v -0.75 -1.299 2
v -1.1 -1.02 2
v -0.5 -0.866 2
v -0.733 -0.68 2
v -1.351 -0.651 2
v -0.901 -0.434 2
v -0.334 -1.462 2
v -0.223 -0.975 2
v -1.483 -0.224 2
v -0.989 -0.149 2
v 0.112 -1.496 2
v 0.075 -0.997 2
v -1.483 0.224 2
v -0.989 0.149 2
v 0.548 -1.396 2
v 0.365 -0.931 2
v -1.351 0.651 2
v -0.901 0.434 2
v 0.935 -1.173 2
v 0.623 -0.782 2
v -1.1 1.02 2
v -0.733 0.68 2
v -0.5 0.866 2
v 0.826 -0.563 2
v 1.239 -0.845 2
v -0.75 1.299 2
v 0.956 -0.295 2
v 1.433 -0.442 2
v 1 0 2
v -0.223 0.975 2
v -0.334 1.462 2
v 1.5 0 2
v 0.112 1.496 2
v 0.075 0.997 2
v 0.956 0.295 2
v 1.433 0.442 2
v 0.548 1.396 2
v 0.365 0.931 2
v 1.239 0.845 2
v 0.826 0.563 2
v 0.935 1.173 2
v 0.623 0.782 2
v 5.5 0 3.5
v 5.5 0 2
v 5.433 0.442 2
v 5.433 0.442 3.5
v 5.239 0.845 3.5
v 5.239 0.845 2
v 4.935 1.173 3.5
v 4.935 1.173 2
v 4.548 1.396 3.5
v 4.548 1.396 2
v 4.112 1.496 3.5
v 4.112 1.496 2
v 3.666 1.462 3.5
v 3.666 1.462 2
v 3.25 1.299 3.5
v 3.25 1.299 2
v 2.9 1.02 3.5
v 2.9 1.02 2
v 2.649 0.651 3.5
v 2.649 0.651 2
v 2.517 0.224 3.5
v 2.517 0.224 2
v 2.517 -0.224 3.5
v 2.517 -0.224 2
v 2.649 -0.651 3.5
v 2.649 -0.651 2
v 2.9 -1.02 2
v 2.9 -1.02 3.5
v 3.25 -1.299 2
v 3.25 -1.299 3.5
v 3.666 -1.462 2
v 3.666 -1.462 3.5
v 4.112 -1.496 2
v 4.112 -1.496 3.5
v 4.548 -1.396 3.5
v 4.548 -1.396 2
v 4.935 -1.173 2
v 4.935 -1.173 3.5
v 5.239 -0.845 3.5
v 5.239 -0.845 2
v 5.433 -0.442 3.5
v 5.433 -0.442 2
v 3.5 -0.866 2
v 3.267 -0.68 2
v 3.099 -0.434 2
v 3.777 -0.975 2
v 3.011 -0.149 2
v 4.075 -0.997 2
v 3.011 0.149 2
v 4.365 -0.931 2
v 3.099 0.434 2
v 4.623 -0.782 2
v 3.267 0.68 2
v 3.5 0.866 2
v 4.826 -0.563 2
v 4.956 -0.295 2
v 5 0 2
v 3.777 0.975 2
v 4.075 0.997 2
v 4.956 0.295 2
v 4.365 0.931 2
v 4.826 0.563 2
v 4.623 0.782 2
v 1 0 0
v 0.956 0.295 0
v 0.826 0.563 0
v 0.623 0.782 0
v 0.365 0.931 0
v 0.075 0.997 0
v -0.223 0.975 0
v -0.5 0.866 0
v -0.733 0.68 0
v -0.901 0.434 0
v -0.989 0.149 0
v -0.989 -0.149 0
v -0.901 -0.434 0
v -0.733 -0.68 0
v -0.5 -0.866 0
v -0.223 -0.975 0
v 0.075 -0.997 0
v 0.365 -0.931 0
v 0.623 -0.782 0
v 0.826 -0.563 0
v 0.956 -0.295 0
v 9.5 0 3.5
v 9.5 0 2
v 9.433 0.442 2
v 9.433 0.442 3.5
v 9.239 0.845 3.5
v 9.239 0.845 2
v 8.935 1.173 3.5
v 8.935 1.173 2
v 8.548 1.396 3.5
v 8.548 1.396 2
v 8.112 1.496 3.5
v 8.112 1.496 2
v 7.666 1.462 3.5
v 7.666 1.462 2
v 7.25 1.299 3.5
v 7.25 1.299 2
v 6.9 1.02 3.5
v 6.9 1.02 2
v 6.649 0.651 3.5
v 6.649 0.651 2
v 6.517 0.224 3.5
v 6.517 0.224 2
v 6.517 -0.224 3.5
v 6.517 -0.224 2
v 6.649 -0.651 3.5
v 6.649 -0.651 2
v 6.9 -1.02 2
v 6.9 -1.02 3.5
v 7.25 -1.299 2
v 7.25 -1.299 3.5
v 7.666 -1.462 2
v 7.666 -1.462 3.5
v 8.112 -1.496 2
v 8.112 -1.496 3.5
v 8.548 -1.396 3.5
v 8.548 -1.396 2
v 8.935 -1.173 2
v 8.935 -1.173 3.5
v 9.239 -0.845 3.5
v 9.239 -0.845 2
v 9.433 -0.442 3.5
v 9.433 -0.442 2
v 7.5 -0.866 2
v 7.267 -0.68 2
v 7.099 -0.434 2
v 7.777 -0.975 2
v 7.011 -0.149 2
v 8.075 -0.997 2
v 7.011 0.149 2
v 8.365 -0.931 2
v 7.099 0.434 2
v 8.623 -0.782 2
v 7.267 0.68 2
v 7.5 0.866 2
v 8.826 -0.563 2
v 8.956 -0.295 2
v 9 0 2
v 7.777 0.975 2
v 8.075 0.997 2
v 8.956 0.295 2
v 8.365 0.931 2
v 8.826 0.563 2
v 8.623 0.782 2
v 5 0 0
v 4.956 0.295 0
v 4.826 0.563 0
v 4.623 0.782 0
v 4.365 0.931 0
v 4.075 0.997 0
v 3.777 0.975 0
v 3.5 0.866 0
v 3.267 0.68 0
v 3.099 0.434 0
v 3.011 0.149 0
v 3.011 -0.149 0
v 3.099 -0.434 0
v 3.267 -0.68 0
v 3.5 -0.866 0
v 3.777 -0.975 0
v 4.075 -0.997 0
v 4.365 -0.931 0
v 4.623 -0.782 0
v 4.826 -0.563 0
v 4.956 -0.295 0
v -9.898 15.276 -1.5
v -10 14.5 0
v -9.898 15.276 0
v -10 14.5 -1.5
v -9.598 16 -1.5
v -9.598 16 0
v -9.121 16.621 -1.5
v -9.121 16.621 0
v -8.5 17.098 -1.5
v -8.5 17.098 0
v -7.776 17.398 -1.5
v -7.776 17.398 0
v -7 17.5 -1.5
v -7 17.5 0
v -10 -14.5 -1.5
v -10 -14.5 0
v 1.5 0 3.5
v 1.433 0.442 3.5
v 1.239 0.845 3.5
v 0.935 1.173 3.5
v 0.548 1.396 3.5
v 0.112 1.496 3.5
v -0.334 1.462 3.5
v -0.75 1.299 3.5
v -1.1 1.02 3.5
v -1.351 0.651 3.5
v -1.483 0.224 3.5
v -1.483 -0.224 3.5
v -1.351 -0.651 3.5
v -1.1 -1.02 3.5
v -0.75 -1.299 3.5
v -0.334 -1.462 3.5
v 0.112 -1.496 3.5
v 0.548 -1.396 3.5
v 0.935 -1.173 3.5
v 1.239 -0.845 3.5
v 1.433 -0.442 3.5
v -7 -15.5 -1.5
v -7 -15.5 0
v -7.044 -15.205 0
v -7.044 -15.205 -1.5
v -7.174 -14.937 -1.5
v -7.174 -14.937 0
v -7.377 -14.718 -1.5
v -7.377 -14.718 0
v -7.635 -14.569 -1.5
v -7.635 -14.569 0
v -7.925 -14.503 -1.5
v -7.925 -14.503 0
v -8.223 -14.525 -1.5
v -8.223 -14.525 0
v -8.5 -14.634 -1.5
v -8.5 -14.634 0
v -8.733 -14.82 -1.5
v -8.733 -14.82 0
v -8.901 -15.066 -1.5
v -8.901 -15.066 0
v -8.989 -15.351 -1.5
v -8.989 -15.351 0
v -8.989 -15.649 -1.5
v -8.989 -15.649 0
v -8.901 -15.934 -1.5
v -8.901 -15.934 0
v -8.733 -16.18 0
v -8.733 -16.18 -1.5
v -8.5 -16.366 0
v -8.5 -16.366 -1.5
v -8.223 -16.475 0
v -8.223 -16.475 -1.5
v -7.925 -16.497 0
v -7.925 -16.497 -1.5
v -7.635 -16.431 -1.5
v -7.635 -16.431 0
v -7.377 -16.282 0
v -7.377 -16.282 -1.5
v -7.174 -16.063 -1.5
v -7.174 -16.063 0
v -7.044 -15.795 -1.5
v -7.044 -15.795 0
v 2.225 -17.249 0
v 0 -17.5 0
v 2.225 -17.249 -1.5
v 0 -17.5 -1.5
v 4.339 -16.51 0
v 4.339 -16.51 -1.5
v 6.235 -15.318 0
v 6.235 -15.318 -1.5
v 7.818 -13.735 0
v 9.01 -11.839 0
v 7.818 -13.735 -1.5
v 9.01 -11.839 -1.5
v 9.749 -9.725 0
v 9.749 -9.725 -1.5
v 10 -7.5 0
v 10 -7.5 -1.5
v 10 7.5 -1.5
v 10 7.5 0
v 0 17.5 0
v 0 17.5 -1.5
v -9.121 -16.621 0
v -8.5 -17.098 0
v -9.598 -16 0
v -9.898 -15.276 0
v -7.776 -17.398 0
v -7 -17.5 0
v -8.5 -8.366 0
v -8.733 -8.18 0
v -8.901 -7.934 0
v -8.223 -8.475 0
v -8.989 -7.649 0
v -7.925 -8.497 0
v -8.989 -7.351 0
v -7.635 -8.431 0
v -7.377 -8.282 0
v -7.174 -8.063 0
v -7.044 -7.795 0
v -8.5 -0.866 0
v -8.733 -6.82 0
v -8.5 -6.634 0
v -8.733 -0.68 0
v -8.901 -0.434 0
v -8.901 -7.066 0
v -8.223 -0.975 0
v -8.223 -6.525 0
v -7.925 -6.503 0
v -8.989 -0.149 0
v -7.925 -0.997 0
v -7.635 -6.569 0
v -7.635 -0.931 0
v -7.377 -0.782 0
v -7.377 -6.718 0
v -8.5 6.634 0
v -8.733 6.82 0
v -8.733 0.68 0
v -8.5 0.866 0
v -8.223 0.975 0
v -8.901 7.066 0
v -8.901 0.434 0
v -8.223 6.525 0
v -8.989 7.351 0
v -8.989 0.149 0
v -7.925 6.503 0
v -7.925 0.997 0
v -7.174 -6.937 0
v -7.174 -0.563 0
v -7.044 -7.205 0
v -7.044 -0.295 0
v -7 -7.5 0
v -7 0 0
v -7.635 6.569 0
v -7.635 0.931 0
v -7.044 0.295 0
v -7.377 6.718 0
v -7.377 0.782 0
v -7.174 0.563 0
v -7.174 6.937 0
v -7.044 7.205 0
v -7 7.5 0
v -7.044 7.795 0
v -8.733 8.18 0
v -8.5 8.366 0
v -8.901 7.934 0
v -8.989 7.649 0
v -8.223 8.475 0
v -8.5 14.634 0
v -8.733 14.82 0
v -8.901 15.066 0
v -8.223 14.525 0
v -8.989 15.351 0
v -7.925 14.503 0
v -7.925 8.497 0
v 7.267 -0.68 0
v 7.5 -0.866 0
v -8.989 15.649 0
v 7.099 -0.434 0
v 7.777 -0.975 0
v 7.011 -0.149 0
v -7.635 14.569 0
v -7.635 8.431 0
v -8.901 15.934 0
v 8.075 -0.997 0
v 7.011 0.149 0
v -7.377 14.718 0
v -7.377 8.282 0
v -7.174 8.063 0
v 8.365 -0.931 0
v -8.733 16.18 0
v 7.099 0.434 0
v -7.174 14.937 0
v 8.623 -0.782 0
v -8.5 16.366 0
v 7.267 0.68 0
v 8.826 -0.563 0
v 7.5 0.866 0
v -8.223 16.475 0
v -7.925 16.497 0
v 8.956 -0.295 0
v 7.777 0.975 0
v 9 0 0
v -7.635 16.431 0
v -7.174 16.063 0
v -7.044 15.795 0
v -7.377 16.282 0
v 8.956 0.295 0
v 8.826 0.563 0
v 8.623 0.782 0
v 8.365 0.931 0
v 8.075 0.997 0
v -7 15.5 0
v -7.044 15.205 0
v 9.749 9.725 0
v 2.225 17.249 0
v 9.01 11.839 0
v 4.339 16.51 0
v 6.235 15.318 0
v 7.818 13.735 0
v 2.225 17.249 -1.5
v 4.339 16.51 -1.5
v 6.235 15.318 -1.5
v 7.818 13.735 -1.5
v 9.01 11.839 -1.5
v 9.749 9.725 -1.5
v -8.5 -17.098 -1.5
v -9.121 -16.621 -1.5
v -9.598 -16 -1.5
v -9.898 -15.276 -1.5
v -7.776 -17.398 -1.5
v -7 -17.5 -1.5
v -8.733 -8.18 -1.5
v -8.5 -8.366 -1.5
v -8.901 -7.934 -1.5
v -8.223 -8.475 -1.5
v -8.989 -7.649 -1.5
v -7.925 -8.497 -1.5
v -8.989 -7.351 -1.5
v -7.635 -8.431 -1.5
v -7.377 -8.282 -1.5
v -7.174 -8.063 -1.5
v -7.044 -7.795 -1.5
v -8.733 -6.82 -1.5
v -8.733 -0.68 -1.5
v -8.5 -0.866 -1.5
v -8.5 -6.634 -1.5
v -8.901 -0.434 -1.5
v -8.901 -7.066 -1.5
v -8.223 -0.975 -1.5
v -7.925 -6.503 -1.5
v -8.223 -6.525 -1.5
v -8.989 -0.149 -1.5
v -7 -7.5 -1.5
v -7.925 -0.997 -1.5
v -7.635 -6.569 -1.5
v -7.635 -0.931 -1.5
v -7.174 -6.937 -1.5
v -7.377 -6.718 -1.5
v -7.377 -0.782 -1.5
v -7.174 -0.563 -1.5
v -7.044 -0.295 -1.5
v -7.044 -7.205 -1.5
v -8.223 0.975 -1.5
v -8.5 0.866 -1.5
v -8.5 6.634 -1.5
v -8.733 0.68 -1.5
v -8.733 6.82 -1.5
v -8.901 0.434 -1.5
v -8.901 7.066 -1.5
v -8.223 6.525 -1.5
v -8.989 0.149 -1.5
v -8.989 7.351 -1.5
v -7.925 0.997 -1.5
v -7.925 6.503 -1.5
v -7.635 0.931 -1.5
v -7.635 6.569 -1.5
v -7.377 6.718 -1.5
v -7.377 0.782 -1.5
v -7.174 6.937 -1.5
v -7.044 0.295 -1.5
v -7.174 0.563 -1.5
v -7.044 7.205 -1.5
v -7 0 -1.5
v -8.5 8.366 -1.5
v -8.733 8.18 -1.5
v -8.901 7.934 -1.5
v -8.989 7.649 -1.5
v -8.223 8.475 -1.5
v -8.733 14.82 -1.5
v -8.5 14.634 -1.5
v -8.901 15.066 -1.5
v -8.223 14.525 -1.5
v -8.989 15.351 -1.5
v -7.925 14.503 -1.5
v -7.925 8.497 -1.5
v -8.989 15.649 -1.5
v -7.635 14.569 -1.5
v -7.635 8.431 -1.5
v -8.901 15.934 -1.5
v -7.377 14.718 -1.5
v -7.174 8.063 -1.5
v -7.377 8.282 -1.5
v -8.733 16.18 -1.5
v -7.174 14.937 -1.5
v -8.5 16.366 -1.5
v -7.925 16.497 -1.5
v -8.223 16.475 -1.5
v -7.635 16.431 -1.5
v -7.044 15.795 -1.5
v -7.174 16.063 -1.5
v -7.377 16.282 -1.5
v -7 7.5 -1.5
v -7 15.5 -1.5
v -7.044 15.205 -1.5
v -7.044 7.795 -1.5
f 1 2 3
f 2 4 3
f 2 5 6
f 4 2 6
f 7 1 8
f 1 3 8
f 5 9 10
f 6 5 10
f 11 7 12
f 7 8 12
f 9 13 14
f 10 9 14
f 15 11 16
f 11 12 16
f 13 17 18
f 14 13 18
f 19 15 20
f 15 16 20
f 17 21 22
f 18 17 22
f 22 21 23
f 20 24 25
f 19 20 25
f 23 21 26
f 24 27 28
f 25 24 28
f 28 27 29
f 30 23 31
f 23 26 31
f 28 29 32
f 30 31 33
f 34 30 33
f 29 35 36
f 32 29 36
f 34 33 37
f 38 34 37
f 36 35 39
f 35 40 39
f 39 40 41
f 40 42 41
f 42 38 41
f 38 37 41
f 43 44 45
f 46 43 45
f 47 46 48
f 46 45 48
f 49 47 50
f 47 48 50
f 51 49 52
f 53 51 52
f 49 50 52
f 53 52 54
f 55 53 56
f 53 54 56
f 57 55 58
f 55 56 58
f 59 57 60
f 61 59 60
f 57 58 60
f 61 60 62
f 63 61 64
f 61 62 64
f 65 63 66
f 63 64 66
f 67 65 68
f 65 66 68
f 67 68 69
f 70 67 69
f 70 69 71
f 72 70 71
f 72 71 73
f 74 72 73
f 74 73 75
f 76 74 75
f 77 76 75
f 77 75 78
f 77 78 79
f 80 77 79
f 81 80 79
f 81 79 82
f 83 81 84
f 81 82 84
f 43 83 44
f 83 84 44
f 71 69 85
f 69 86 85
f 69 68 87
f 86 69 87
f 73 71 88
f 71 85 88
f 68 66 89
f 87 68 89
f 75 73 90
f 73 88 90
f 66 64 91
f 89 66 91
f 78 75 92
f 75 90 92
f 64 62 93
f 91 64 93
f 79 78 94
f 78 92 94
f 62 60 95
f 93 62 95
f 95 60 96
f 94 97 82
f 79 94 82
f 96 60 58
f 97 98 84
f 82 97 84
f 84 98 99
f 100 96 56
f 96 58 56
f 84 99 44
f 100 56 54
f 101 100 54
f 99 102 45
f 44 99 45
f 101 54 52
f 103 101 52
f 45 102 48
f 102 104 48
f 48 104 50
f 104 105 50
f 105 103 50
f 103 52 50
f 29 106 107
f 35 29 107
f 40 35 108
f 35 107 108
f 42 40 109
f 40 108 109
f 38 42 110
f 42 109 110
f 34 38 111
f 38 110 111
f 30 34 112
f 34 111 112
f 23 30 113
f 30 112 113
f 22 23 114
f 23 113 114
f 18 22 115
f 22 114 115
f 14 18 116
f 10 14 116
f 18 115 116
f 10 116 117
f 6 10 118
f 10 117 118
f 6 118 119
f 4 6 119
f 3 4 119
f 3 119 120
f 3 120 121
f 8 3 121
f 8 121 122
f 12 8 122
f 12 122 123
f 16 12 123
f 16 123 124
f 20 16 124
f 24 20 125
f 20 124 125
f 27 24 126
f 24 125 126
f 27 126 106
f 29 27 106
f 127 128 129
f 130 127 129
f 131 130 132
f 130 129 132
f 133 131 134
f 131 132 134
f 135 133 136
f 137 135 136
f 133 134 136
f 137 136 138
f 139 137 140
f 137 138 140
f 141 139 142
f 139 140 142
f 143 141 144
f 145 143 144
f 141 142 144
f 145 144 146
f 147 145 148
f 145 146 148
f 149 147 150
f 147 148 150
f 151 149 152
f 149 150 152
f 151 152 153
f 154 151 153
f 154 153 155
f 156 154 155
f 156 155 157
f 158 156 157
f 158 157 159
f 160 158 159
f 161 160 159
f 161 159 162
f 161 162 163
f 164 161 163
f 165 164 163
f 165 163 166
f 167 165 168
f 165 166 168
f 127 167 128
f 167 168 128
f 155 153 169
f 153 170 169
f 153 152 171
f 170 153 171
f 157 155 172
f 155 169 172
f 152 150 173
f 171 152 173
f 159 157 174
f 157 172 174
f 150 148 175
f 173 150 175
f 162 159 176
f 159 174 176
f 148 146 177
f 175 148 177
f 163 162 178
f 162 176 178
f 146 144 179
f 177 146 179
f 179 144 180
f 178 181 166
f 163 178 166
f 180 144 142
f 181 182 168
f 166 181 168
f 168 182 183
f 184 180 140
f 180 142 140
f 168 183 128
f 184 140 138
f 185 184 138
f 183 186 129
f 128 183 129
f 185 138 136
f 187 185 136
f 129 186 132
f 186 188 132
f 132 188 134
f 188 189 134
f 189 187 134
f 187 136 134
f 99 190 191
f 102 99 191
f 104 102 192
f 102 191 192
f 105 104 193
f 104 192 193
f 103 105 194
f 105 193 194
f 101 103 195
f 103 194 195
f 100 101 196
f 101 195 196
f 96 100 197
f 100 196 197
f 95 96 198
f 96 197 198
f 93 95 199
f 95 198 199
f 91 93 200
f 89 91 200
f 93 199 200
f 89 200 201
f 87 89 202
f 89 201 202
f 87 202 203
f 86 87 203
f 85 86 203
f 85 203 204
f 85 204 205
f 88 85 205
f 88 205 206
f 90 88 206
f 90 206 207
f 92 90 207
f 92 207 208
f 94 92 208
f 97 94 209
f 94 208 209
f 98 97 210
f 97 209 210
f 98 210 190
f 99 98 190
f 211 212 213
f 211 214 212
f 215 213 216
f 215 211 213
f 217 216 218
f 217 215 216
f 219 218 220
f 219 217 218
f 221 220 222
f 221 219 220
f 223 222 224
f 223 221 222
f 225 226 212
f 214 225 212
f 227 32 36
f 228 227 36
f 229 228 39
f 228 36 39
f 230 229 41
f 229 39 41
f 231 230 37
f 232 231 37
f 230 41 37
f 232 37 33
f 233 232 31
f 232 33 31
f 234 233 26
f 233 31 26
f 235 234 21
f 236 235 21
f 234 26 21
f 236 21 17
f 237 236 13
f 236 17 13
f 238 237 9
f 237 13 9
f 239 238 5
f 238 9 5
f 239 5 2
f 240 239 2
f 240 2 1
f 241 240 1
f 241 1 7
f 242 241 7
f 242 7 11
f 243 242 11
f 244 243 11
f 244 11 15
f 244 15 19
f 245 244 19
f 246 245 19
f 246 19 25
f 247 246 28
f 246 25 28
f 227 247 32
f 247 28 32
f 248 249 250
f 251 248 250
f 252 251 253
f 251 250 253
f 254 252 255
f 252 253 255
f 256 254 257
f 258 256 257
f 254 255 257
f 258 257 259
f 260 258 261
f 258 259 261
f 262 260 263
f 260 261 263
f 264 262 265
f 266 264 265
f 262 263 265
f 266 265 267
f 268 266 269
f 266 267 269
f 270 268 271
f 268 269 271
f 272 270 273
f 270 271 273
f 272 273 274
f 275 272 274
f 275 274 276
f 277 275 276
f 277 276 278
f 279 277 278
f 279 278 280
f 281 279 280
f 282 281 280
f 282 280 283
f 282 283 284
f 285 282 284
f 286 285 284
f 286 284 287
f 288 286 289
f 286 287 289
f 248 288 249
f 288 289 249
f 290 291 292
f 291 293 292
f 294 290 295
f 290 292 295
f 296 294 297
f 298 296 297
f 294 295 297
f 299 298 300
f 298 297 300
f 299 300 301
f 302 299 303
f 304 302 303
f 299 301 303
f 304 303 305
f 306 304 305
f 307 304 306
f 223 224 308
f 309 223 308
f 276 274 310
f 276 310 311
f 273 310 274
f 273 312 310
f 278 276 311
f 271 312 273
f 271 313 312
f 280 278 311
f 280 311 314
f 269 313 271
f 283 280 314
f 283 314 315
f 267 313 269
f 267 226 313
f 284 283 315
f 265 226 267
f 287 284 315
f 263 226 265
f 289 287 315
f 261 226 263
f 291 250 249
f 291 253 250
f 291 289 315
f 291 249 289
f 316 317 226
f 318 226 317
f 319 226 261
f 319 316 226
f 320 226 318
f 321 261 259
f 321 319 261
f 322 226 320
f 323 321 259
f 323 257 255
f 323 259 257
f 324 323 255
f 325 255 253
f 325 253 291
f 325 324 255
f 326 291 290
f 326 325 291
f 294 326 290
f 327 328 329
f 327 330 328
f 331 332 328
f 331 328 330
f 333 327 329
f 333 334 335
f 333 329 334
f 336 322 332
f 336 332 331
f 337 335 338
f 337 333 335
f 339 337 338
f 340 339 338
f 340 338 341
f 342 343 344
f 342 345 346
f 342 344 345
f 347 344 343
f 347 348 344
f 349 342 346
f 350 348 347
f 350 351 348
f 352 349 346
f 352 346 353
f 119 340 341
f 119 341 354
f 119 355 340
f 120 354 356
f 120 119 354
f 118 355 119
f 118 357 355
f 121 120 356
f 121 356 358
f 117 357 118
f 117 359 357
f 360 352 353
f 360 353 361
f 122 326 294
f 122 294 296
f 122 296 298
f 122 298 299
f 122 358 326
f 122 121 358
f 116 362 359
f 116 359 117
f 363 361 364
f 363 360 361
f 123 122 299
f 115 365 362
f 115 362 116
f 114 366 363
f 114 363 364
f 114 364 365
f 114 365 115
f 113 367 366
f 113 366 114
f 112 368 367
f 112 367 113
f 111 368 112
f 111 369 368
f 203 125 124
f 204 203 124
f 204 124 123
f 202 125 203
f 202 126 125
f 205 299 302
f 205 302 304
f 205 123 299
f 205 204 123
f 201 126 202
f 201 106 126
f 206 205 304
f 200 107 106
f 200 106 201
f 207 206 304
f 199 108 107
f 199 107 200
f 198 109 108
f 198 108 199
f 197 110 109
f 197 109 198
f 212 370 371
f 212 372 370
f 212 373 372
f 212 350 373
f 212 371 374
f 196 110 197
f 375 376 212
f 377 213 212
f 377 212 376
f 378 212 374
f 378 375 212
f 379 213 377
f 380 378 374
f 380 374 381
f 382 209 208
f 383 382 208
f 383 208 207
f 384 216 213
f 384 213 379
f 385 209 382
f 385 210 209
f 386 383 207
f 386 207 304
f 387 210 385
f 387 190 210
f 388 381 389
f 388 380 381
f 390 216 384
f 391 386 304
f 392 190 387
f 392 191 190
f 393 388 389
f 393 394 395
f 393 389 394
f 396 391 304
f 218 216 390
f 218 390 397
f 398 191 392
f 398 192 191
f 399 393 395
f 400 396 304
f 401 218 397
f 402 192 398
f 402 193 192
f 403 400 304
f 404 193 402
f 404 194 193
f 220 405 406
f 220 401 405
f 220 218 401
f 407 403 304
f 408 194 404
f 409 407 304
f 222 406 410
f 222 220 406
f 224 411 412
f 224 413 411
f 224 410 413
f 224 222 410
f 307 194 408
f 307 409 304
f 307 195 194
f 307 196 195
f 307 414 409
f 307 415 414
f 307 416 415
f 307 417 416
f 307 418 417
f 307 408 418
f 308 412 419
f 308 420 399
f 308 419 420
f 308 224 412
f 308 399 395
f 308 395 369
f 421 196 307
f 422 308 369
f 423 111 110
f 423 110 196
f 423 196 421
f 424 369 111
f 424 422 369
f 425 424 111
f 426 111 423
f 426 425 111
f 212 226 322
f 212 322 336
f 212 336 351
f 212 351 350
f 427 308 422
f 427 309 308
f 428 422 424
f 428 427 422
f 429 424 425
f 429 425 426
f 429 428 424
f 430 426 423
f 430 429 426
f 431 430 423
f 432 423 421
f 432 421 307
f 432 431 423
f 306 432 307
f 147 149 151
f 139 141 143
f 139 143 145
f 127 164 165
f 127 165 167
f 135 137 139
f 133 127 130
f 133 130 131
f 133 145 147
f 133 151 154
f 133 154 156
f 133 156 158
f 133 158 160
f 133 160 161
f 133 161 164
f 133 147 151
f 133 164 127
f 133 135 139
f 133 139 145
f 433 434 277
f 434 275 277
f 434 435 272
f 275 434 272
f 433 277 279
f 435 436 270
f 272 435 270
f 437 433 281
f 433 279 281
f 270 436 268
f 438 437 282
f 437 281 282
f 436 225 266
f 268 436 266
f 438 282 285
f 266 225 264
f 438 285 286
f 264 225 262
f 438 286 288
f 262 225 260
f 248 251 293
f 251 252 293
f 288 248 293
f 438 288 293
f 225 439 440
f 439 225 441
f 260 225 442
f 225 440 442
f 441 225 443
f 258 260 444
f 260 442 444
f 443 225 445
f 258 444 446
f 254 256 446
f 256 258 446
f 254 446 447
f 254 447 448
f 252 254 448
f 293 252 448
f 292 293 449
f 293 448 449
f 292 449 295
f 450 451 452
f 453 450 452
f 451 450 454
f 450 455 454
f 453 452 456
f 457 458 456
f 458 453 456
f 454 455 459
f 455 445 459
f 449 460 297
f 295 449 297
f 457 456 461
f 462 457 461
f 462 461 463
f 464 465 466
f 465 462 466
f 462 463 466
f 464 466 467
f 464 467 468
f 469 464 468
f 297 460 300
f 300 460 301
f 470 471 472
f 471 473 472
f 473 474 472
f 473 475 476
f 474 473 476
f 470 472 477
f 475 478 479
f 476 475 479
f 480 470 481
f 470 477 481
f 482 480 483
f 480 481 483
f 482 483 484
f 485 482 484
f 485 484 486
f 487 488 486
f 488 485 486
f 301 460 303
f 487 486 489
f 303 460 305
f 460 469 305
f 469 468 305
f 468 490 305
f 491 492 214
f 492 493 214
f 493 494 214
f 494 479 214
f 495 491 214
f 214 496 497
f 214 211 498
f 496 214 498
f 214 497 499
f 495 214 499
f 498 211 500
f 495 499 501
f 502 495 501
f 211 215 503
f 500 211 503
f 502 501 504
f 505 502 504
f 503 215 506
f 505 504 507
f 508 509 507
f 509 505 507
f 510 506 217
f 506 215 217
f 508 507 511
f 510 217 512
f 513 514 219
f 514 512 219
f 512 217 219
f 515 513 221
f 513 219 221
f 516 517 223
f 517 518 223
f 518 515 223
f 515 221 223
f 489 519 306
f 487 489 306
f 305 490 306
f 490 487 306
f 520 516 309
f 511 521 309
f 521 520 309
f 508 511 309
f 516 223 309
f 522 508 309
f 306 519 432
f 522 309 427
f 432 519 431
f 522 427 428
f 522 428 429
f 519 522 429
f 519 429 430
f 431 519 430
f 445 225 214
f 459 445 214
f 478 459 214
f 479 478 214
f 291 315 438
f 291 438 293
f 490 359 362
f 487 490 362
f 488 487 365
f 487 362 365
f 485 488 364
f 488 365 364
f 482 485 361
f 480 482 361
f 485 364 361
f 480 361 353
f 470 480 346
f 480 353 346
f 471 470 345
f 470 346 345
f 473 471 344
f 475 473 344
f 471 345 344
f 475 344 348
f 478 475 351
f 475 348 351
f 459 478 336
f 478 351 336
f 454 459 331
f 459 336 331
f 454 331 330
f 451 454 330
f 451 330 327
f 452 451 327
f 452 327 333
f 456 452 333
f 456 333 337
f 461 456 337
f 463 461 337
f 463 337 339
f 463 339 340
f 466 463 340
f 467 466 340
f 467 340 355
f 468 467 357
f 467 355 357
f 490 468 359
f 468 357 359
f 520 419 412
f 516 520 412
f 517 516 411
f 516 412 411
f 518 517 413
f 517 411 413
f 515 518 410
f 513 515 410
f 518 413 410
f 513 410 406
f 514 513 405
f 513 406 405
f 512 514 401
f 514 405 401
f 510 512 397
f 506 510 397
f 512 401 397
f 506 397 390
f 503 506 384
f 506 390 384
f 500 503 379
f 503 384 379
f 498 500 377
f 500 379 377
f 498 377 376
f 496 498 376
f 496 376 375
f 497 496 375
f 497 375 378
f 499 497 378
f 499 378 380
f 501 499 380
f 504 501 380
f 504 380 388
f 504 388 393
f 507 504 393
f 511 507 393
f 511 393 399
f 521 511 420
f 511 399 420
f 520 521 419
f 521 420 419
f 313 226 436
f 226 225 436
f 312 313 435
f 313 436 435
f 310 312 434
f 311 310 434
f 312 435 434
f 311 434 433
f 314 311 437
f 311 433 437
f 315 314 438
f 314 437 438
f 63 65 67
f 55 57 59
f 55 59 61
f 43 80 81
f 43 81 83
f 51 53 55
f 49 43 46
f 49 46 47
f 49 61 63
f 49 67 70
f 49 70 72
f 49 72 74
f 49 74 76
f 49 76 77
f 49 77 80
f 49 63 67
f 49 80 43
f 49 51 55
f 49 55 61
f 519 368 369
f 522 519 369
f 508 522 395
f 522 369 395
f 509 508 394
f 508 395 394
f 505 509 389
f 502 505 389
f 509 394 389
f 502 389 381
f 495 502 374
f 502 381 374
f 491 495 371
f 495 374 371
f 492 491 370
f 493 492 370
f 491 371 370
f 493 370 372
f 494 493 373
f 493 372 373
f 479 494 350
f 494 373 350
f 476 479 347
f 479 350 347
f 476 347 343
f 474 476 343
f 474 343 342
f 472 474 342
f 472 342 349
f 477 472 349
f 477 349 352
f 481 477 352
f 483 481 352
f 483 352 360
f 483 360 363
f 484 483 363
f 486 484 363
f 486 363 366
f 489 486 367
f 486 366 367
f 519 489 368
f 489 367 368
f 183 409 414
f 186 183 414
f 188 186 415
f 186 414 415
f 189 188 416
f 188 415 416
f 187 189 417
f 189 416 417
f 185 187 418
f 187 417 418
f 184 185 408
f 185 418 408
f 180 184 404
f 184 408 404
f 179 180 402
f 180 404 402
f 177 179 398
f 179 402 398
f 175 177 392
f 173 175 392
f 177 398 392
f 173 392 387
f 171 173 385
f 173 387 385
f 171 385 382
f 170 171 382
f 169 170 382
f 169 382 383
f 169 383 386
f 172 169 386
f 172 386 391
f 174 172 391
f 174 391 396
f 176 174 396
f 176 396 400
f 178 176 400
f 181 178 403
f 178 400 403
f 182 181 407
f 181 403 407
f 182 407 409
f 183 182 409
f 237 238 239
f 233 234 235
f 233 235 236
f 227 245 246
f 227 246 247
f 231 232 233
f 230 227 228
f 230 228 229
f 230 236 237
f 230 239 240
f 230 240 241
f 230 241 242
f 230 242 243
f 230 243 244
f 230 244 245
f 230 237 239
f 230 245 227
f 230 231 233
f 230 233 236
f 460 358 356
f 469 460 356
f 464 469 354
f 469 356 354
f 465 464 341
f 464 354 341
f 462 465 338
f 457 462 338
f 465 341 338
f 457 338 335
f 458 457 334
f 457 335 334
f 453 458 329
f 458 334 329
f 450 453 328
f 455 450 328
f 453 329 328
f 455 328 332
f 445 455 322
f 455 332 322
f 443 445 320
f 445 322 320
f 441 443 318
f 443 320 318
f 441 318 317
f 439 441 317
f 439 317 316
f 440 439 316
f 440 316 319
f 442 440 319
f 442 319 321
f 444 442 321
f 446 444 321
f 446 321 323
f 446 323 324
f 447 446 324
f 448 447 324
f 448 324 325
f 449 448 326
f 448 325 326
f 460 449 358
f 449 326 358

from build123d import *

# Parameters (mm, degrees)
F0_W     = 20
F0_H     = 35
F1_DEPTH = 1.5
F2_R     = 1
F3_DEPTH = 1.5
F4_R     = 3
F5_R     = 10
F6_R     = 1
F7_DEPTH = 2
F8_R     = 1.5
F8_R_2   = 1
F9_DEPTH = 1.5


with BuildPart() as f1:
    # F0 (on Top) → F1 (new body)
    with BuildSketch(Plane.XY):
        Rectangle(F0_W, F0_H)
    extrude(amount=-F1_DEPTH)

    # F2 (on face) → F3 (cut)
    with BuildSketch(Plane.XY):
        with Locations((-8, 15.5)):
            Circle(F2_R)
        with Locations((-8, 7.5)):
            Circle(F2_R)
        with Locations((-8, 0)):
            Circle(F2_R)
        with Locations((-8, -7.5)):
            Circle(F2_R)
        with Locations((-8, -15.5)):
            Circle(F2_R)
    extrude(amount=-F3_DEPTH, mode=Mode.SUBTRACT)

    # F4
    f4_edges = [f1.edges().sort_by_distance(p)[0] for p in [
        (-10, -17.5, -0.75),
        (-10, 17.5, -0.75),
    ]]
    fillet(f4_edges, radius=F4_R)

    # F5
    f5_edges = [f1.edges().sort_by_distance(p)[0] for p in [
        (10, 17.5, -0.75),
        (10, -17.5, -0.75),
    ]]
    fillet(f5_edges, radius=F5_R)

    # F6 (on face) → F7 (join)
    with BuildSketch(Plane.XY):
        Circle(F6_R)
        with Locations((4, 0)):
            Circle(F6_R)
        with Locations((8, 0)):
            Circle(F6_R)
    extrude(amount=F7_DEPTH)

    # F8 (on face) → F9 (join)
    with BuildSketch(Plane.XY.offset(2)):
        Circle(F8_R)
        Circle(F8_R_2, mode=Mode.SUBTRACT)
        with Locations((4, 0)):
            Circle(F8_R)
        with Locations((8, 0)):
            Circle(F8_R)
        Circle(F8_R_2)
    extrude(amount=F9_DEPTH)


solid = f1.part
